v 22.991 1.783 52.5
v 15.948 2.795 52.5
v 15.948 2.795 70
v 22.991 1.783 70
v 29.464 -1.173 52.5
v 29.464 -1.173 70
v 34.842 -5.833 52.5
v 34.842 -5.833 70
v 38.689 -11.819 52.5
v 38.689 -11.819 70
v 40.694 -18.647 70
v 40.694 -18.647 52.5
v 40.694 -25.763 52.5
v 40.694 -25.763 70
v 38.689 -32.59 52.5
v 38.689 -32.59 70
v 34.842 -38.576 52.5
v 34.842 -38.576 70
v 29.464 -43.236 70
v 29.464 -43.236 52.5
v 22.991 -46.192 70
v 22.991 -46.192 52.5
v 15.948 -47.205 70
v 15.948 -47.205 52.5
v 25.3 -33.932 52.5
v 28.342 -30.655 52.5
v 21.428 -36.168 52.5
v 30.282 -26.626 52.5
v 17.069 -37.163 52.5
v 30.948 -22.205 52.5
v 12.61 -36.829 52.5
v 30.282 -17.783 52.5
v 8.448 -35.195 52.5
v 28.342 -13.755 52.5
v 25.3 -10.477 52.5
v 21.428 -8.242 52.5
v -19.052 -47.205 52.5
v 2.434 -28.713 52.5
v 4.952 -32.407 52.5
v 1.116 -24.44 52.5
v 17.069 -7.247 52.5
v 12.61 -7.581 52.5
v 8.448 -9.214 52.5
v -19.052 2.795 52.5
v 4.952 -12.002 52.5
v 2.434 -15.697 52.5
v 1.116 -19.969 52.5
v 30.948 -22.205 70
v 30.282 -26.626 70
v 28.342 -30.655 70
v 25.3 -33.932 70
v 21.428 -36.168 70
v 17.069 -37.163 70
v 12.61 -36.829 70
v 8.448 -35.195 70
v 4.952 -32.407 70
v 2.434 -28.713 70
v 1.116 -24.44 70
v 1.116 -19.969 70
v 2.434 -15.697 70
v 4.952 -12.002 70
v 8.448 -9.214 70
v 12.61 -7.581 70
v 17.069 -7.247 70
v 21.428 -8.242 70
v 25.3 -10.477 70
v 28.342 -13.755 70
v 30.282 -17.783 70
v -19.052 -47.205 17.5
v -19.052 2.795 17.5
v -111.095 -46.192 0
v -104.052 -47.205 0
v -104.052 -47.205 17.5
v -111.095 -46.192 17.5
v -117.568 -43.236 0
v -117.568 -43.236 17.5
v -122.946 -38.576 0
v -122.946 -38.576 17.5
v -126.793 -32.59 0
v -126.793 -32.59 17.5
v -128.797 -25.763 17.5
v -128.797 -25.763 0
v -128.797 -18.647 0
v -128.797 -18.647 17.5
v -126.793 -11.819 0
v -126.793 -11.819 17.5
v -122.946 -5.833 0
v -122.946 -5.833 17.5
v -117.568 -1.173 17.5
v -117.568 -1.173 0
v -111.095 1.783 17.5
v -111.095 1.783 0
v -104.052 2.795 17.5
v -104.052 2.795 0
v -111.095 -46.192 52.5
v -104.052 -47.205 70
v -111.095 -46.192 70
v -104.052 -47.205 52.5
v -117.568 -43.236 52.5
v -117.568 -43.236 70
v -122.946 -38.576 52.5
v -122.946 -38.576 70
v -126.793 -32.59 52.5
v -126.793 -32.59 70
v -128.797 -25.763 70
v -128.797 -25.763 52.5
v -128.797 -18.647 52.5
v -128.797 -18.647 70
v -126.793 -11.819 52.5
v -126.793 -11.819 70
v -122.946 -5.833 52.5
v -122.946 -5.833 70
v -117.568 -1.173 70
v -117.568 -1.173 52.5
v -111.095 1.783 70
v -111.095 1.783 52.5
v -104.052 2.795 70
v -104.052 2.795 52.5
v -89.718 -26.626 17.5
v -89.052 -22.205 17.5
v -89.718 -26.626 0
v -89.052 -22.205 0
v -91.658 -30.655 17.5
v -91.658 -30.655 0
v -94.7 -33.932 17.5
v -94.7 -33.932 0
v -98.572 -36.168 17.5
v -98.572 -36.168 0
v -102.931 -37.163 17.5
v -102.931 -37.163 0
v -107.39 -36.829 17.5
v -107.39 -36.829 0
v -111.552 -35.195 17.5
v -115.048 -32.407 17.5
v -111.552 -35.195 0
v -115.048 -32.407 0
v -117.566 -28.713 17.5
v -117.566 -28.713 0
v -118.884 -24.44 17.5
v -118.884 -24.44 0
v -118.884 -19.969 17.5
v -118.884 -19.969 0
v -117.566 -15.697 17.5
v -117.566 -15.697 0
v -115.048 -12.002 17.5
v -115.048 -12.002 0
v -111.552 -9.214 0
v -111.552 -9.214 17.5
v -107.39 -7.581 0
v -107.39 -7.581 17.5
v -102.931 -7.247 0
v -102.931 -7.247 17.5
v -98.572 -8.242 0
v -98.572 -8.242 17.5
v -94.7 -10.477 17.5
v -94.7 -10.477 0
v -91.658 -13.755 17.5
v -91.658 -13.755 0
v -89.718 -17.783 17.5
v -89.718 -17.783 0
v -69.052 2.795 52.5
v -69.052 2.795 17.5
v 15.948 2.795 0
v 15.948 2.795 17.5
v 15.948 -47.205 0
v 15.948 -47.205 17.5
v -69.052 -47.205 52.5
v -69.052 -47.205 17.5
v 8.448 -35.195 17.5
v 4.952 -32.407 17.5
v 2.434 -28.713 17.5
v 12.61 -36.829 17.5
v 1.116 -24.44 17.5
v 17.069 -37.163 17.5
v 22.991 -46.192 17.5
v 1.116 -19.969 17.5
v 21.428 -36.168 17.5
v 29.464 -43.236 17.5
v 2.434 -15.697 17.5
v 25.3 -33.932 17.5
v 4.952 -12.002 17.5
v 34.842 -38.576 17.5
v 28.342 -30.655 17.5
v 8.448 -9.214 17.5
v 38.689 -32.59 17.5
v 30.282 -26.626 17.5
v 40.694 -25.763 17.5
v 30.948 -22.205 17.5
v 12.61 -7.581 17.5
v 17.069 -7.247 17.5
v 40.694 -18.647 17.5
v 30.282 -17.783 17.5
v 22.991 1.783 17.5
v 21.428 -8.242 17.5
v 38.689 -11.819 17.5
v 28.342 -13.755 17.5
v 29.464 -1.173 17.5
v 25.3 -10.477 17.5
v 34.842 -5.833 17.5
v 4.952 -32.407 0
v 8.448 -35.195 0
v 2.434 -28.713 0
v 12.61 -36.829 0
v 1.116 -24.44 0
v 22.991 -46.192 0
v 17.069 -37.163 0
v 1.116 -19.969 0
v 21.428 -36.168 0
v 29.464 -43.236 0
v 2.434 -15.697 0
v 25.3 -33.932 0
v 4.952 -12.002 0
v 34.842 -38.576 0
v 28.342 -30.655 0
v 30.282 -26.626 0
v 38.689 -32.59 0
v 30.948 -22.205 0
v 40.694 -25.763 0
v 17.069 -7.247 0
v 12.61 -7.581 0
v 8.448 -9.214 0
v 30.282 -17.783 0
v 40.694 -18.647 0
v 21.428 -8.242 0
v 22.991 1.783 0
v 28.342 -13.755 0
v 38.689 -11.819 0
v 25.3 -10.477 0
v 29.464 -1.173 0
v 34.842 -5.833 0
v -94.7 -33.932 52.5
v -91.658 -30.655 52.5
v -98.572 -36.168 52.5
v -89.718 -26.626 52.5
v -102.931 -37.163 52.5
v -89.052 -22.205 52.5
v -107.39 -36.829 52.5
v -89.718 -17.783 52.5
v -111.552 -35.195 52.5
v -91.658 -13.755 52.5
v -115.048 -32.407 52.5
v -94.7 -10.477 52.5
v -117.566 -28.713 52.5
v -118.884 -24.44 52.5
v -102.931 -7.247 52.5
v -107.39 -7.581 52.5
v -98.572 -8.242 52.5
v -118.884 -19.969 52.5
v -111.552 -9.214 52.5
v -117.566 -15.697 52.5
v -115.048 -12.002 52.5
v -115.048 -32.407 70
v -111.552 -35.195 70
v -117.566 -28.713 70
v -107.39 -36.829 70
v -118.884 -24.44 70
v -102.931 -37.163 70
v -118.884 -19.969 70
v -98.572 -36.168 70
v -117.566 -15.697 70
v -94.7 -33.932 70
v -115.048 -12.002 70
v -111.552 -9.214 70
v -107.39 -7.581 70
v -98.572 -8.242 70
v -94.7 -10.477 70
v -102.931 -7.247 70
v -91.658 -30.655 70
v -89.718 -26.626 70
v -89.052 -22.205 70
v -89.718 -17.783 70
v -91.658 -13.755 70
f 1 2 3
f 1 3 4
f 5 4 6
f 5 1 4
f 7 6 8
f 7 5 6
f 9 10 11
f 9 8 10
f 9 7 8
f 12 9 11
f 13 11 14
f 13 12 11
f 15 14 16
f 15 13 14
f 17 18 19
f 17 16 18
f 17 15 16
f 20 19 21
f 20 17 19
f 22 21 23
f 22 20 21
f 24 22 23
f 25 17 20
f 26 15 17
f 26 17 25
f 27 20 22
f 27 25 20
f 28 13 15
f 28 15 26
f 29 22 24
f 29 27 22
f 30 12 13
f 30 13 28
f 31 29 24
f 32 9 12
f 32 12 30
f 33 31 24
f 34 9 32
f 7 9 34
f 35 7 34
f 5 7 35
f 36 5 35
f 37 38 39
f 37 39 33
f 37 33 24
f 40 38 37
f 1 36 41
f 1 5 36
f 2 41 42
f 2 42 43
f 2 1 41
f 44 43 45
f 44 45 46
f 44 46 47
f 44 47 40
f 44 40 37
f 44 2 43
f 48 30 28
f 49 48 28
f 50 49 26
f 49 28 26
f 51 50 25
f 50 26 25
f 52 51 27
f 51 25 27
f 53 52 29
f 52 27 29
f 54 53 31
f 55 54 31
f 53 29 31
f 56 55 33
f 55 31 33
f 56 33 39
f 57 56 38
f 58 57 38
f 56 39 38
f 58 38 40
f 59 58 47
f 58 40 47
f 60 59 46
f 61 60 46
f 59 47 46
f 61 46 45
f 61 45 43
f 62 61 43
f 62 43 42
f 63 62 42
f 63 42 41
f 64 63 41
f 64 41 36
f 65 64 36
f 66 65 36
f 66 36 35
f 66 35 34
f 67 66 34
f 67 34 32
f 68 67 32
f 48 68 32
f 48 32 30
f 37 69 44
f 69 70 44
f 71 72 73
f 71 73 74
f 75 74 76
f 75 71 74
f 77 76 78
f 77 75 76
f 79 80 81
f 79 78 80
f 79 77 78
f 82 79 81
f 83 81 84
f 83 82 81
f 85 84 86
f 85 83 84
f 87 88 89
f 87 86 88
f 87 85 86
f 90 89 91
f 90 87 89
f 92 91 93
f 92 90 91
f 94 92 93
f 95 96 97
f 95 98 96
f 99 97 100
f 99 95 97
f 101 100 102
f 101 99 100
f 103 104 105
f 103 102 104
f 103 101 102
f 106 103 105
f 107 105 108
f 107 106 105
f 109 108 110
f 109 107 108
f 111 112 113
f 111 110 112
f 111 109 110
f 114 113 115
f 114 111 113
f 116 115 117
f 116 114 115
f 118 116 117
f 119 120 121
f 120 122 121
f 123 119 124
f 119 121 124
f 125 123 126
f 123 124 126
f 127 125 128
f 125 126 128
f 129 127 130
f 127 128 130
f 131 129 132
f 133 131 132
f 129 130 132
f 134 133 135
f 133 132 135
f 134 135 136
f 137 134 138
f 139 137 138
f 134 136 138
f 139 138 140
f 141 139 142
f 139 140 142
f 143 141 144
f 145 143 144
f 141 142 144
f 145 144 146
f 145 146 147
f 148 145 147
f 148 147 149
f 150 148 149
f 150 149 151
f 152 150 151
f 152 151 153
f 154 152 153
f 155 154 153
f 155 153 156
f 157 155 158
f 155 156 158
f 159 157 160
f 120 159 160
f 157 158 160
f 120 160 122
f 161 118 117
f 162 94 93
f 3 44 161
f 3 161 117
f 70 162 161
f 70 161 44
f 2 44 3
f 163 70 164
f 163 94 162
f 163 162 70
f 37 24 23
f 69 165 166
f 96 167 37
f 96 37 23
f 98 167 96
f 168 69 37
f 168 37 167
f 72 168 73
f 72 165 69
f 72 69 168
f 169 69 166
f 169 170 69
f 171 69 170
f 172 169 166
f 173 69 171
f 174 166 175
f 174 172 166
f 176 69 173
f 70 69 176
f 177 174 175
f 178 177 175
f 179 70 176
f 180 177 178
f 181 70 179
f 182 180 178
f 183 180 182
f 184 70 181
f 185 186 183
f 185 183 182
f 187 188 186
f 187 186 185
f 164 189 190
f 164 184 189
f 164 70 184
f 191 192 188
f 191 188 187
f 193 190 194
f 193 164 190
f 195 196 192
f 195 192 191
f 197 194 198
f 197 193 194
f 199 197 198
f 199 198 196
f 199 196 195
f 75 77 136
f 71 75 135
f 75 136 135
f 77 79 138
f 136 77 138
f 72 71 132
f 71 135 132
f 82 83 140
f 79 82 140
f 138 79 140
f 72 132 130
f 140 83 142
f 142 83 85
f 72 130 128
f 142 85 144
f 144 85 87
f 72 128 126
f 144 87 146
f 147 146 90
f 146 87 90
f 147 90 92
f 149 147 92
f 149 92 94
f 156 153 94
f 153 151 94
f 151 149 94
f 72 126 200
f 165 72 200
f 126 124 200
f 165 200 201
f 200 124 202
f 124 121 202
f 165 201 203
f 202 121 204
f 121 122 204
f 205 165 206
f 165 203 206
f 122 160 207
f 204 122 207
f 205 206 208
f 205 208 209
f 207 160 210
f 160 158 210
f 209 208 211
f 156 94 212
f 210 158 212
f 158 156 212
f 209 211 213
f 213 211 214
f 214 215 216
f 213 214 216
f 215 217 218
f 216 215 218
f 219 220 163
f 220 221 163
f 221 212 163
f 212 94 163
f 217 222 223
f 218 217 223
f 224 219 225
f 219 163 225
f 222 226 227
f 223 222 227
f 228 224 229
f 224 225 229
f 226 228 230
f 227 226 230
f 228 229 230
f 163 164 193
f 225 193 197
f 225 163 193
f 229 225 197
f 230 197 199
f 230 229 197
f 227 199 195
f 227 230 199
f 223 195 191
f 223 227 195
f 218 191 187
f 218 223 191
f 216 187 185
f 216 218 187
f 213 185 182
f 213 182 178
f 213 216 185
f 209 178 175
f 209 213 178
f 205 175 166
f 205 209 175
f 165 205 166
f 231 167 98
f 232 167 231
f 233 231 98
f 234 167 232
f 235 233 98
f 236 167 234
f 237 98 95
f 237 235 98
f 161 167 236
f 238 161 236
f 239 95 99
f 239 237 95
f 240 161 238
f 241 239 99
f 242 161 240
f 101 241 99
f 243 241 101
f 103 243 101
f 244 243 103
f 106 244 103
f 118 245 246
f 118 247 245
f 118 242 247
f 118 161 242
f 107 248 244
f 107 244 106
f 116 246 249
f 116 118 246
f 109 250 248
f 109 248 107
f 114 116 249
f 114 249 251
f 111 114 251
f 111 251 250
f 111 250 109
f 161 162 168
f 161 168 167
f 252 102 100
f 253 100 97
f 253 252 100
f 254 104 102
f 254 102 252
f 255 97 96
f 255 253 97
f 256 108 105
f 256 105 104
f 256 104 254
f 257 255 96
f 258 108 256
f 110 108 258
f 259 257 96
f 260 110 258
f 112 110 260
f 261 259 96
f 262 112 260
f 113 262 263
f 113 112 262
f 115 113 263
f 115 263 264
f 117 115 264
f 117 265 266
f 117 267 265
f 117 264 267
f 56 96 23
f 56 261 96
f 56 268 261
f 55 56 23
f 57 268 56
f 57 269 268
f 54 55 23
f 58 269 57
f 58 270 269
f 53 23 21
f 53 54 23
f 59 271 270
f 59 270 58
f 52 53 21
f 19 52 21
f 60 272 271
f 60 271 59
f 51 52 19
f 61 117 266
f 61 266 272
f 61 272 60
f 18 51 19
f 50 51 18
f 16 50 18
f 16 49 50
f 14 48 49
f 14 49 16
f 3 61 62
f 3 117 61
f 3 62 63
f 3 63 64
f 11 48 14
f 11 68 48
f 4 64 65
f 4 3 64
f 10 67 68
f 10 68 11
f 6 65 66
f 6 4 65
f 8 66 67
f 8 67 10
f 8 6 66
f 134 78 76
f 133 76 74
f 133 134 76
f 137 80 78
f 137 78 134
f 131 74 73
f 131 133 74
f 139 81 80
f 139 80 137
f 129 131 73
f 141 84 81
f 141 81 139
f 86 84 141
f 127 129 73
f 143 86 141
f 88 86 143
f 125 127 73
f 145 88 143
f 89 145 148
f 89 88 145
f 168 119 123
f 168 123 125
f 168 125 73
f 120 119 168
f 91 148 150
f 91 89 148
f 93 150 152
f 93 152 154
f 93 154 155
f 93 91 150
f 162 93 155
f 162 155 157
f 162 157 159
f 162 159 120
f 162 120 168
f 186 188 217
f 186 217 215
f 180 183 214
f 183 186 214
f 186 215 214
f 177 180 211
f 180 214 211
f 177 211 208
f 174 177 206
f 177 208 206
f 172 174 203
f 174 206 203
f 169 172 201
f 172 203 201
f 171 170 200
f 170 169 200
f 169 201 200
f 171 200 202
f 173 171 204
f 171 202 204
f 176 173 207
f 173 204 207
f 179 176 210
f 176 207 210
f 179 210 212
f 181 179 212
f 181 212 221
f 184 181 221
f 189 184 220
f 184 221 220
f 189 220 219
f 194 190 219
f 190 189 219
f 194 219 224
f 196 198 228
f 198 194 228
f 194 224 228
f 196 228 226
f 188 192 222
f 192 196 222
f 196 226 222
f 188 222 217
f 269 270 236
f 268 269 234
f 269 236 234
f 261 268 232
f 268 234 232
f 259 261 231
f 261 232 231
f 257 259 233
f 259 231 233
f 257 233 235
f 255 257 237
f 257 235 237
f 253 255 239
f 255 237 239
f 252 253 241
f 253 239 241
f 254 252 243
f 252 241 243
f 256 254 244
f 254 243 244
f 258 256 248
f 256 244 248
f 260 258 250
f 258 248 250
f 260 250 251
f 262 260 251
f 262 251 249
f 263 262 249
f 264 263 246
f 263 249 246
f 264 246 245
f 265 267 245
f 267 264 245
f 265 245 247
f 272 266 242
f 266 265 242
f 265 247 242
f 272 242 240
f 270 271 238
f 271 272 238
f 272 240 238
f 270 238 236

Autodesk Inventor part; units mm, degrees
ref_plane "YZ Plane" through (0, 0, 0) normal (1, 0, 0) x (0, 1, 0)
ref_plane "XZ Plane" through (0, 0, 0) normal (0, 1, 0) x (-1, 0, 0)
ref_plane "XY Plane" through (0, 0, 0) normal (0, 0, 1) x (1, 0, 0)
sketch "草图1" plane through (0, 0, 0) normal (0, 0, 1) x (1, 0, 0)
  line L0 (-44.0519, -22.2048) -> (24.7481, -22.2048)
  line L1 (-44.0519, -22.2048) -> (-44.0519, 41.5952)
  line L2 (-104.0519, 2.7952) -> (15.9481, 2.7952)
  line L3 (15.9481, -47.2048) -> (-104.0519, -47.2048)
  line L4 (-104.0519, 2.7952) -> (15.9481, -47.2048) construction
  line L5 (15.9481, 2.7952) -> (-104.0519, -47.2048) construction
  arc A0 (15.9481, -47.2048) -> (15.9481, 2.7952) centre (15.9481, -22.2048) ccw
  arc A1 (-104.0519, 2.7952) -> (-104.0519, -47.2048) centre (-104.0519, -22.2048) ccw
  circle A2 centre (-104.0519, -22.2048) radius 15
  circle A3 centre (15.9481, -22.2048) radius 15
  dimension "d2" = 25
  dimension "d3" = 50
  dimension "d4" = 120
  dimension "d7" = 30
  dimension "d8" = 30
  dimension "d14" = 50
extrude "拉伸1" add sketch "草图1" along normal blind 70
sketch "草图2" plane through (-104.0519, 2.7952, 0) normal (0, 1, 0) x (1, 0, 0)
  line L0 (0, 0) -> (120, 0) projected
  line L1 (60, 0) -> (60, -70)
  line L2 (120, -70) -> (0, -70) projected
  line L3 (-25, 0) -> (-25, -70) projected
  line L4 (-25, -35) -> (145, -35)
  line L5 (145, 0) -> (145, -70) projected
  line L6 (145, -17.5) -> (145, -52.5)
  line L7 (-25, -52.5) -> (-25, -17.5)
  line L8 (-25, -17.5) -> (145, -52.5) construction
  line L9 (145, -17.5) -> (-25, -52.5) construction
  line L10 (35, -17.5) -> (35, -52.5)
  line L11 (85, -17.5) -> (85, -52.5)
  line L12 (145, -52.5) -> (85, -52.5)
  line L13 (35, -52.5) -> (-25, -52.5)
  line L14 (-25, -17.5) -> (35, -17.5)
  line L15 (85, -17.5) -> (145, -17.5)
  point P0 (104.0519, 0)
  point P1 (60, -35)
  dimension "d10" = 60
  dimension "d11" = 60
  dimension "d15" = 35
  dimension "d16" = 17.5
  dimension "d17" = 35
extrude "拉伸2" cut sketch "草图2" against normal blind 70
properties part number "ConnectBoard" material "钢，高强度，低合金"
